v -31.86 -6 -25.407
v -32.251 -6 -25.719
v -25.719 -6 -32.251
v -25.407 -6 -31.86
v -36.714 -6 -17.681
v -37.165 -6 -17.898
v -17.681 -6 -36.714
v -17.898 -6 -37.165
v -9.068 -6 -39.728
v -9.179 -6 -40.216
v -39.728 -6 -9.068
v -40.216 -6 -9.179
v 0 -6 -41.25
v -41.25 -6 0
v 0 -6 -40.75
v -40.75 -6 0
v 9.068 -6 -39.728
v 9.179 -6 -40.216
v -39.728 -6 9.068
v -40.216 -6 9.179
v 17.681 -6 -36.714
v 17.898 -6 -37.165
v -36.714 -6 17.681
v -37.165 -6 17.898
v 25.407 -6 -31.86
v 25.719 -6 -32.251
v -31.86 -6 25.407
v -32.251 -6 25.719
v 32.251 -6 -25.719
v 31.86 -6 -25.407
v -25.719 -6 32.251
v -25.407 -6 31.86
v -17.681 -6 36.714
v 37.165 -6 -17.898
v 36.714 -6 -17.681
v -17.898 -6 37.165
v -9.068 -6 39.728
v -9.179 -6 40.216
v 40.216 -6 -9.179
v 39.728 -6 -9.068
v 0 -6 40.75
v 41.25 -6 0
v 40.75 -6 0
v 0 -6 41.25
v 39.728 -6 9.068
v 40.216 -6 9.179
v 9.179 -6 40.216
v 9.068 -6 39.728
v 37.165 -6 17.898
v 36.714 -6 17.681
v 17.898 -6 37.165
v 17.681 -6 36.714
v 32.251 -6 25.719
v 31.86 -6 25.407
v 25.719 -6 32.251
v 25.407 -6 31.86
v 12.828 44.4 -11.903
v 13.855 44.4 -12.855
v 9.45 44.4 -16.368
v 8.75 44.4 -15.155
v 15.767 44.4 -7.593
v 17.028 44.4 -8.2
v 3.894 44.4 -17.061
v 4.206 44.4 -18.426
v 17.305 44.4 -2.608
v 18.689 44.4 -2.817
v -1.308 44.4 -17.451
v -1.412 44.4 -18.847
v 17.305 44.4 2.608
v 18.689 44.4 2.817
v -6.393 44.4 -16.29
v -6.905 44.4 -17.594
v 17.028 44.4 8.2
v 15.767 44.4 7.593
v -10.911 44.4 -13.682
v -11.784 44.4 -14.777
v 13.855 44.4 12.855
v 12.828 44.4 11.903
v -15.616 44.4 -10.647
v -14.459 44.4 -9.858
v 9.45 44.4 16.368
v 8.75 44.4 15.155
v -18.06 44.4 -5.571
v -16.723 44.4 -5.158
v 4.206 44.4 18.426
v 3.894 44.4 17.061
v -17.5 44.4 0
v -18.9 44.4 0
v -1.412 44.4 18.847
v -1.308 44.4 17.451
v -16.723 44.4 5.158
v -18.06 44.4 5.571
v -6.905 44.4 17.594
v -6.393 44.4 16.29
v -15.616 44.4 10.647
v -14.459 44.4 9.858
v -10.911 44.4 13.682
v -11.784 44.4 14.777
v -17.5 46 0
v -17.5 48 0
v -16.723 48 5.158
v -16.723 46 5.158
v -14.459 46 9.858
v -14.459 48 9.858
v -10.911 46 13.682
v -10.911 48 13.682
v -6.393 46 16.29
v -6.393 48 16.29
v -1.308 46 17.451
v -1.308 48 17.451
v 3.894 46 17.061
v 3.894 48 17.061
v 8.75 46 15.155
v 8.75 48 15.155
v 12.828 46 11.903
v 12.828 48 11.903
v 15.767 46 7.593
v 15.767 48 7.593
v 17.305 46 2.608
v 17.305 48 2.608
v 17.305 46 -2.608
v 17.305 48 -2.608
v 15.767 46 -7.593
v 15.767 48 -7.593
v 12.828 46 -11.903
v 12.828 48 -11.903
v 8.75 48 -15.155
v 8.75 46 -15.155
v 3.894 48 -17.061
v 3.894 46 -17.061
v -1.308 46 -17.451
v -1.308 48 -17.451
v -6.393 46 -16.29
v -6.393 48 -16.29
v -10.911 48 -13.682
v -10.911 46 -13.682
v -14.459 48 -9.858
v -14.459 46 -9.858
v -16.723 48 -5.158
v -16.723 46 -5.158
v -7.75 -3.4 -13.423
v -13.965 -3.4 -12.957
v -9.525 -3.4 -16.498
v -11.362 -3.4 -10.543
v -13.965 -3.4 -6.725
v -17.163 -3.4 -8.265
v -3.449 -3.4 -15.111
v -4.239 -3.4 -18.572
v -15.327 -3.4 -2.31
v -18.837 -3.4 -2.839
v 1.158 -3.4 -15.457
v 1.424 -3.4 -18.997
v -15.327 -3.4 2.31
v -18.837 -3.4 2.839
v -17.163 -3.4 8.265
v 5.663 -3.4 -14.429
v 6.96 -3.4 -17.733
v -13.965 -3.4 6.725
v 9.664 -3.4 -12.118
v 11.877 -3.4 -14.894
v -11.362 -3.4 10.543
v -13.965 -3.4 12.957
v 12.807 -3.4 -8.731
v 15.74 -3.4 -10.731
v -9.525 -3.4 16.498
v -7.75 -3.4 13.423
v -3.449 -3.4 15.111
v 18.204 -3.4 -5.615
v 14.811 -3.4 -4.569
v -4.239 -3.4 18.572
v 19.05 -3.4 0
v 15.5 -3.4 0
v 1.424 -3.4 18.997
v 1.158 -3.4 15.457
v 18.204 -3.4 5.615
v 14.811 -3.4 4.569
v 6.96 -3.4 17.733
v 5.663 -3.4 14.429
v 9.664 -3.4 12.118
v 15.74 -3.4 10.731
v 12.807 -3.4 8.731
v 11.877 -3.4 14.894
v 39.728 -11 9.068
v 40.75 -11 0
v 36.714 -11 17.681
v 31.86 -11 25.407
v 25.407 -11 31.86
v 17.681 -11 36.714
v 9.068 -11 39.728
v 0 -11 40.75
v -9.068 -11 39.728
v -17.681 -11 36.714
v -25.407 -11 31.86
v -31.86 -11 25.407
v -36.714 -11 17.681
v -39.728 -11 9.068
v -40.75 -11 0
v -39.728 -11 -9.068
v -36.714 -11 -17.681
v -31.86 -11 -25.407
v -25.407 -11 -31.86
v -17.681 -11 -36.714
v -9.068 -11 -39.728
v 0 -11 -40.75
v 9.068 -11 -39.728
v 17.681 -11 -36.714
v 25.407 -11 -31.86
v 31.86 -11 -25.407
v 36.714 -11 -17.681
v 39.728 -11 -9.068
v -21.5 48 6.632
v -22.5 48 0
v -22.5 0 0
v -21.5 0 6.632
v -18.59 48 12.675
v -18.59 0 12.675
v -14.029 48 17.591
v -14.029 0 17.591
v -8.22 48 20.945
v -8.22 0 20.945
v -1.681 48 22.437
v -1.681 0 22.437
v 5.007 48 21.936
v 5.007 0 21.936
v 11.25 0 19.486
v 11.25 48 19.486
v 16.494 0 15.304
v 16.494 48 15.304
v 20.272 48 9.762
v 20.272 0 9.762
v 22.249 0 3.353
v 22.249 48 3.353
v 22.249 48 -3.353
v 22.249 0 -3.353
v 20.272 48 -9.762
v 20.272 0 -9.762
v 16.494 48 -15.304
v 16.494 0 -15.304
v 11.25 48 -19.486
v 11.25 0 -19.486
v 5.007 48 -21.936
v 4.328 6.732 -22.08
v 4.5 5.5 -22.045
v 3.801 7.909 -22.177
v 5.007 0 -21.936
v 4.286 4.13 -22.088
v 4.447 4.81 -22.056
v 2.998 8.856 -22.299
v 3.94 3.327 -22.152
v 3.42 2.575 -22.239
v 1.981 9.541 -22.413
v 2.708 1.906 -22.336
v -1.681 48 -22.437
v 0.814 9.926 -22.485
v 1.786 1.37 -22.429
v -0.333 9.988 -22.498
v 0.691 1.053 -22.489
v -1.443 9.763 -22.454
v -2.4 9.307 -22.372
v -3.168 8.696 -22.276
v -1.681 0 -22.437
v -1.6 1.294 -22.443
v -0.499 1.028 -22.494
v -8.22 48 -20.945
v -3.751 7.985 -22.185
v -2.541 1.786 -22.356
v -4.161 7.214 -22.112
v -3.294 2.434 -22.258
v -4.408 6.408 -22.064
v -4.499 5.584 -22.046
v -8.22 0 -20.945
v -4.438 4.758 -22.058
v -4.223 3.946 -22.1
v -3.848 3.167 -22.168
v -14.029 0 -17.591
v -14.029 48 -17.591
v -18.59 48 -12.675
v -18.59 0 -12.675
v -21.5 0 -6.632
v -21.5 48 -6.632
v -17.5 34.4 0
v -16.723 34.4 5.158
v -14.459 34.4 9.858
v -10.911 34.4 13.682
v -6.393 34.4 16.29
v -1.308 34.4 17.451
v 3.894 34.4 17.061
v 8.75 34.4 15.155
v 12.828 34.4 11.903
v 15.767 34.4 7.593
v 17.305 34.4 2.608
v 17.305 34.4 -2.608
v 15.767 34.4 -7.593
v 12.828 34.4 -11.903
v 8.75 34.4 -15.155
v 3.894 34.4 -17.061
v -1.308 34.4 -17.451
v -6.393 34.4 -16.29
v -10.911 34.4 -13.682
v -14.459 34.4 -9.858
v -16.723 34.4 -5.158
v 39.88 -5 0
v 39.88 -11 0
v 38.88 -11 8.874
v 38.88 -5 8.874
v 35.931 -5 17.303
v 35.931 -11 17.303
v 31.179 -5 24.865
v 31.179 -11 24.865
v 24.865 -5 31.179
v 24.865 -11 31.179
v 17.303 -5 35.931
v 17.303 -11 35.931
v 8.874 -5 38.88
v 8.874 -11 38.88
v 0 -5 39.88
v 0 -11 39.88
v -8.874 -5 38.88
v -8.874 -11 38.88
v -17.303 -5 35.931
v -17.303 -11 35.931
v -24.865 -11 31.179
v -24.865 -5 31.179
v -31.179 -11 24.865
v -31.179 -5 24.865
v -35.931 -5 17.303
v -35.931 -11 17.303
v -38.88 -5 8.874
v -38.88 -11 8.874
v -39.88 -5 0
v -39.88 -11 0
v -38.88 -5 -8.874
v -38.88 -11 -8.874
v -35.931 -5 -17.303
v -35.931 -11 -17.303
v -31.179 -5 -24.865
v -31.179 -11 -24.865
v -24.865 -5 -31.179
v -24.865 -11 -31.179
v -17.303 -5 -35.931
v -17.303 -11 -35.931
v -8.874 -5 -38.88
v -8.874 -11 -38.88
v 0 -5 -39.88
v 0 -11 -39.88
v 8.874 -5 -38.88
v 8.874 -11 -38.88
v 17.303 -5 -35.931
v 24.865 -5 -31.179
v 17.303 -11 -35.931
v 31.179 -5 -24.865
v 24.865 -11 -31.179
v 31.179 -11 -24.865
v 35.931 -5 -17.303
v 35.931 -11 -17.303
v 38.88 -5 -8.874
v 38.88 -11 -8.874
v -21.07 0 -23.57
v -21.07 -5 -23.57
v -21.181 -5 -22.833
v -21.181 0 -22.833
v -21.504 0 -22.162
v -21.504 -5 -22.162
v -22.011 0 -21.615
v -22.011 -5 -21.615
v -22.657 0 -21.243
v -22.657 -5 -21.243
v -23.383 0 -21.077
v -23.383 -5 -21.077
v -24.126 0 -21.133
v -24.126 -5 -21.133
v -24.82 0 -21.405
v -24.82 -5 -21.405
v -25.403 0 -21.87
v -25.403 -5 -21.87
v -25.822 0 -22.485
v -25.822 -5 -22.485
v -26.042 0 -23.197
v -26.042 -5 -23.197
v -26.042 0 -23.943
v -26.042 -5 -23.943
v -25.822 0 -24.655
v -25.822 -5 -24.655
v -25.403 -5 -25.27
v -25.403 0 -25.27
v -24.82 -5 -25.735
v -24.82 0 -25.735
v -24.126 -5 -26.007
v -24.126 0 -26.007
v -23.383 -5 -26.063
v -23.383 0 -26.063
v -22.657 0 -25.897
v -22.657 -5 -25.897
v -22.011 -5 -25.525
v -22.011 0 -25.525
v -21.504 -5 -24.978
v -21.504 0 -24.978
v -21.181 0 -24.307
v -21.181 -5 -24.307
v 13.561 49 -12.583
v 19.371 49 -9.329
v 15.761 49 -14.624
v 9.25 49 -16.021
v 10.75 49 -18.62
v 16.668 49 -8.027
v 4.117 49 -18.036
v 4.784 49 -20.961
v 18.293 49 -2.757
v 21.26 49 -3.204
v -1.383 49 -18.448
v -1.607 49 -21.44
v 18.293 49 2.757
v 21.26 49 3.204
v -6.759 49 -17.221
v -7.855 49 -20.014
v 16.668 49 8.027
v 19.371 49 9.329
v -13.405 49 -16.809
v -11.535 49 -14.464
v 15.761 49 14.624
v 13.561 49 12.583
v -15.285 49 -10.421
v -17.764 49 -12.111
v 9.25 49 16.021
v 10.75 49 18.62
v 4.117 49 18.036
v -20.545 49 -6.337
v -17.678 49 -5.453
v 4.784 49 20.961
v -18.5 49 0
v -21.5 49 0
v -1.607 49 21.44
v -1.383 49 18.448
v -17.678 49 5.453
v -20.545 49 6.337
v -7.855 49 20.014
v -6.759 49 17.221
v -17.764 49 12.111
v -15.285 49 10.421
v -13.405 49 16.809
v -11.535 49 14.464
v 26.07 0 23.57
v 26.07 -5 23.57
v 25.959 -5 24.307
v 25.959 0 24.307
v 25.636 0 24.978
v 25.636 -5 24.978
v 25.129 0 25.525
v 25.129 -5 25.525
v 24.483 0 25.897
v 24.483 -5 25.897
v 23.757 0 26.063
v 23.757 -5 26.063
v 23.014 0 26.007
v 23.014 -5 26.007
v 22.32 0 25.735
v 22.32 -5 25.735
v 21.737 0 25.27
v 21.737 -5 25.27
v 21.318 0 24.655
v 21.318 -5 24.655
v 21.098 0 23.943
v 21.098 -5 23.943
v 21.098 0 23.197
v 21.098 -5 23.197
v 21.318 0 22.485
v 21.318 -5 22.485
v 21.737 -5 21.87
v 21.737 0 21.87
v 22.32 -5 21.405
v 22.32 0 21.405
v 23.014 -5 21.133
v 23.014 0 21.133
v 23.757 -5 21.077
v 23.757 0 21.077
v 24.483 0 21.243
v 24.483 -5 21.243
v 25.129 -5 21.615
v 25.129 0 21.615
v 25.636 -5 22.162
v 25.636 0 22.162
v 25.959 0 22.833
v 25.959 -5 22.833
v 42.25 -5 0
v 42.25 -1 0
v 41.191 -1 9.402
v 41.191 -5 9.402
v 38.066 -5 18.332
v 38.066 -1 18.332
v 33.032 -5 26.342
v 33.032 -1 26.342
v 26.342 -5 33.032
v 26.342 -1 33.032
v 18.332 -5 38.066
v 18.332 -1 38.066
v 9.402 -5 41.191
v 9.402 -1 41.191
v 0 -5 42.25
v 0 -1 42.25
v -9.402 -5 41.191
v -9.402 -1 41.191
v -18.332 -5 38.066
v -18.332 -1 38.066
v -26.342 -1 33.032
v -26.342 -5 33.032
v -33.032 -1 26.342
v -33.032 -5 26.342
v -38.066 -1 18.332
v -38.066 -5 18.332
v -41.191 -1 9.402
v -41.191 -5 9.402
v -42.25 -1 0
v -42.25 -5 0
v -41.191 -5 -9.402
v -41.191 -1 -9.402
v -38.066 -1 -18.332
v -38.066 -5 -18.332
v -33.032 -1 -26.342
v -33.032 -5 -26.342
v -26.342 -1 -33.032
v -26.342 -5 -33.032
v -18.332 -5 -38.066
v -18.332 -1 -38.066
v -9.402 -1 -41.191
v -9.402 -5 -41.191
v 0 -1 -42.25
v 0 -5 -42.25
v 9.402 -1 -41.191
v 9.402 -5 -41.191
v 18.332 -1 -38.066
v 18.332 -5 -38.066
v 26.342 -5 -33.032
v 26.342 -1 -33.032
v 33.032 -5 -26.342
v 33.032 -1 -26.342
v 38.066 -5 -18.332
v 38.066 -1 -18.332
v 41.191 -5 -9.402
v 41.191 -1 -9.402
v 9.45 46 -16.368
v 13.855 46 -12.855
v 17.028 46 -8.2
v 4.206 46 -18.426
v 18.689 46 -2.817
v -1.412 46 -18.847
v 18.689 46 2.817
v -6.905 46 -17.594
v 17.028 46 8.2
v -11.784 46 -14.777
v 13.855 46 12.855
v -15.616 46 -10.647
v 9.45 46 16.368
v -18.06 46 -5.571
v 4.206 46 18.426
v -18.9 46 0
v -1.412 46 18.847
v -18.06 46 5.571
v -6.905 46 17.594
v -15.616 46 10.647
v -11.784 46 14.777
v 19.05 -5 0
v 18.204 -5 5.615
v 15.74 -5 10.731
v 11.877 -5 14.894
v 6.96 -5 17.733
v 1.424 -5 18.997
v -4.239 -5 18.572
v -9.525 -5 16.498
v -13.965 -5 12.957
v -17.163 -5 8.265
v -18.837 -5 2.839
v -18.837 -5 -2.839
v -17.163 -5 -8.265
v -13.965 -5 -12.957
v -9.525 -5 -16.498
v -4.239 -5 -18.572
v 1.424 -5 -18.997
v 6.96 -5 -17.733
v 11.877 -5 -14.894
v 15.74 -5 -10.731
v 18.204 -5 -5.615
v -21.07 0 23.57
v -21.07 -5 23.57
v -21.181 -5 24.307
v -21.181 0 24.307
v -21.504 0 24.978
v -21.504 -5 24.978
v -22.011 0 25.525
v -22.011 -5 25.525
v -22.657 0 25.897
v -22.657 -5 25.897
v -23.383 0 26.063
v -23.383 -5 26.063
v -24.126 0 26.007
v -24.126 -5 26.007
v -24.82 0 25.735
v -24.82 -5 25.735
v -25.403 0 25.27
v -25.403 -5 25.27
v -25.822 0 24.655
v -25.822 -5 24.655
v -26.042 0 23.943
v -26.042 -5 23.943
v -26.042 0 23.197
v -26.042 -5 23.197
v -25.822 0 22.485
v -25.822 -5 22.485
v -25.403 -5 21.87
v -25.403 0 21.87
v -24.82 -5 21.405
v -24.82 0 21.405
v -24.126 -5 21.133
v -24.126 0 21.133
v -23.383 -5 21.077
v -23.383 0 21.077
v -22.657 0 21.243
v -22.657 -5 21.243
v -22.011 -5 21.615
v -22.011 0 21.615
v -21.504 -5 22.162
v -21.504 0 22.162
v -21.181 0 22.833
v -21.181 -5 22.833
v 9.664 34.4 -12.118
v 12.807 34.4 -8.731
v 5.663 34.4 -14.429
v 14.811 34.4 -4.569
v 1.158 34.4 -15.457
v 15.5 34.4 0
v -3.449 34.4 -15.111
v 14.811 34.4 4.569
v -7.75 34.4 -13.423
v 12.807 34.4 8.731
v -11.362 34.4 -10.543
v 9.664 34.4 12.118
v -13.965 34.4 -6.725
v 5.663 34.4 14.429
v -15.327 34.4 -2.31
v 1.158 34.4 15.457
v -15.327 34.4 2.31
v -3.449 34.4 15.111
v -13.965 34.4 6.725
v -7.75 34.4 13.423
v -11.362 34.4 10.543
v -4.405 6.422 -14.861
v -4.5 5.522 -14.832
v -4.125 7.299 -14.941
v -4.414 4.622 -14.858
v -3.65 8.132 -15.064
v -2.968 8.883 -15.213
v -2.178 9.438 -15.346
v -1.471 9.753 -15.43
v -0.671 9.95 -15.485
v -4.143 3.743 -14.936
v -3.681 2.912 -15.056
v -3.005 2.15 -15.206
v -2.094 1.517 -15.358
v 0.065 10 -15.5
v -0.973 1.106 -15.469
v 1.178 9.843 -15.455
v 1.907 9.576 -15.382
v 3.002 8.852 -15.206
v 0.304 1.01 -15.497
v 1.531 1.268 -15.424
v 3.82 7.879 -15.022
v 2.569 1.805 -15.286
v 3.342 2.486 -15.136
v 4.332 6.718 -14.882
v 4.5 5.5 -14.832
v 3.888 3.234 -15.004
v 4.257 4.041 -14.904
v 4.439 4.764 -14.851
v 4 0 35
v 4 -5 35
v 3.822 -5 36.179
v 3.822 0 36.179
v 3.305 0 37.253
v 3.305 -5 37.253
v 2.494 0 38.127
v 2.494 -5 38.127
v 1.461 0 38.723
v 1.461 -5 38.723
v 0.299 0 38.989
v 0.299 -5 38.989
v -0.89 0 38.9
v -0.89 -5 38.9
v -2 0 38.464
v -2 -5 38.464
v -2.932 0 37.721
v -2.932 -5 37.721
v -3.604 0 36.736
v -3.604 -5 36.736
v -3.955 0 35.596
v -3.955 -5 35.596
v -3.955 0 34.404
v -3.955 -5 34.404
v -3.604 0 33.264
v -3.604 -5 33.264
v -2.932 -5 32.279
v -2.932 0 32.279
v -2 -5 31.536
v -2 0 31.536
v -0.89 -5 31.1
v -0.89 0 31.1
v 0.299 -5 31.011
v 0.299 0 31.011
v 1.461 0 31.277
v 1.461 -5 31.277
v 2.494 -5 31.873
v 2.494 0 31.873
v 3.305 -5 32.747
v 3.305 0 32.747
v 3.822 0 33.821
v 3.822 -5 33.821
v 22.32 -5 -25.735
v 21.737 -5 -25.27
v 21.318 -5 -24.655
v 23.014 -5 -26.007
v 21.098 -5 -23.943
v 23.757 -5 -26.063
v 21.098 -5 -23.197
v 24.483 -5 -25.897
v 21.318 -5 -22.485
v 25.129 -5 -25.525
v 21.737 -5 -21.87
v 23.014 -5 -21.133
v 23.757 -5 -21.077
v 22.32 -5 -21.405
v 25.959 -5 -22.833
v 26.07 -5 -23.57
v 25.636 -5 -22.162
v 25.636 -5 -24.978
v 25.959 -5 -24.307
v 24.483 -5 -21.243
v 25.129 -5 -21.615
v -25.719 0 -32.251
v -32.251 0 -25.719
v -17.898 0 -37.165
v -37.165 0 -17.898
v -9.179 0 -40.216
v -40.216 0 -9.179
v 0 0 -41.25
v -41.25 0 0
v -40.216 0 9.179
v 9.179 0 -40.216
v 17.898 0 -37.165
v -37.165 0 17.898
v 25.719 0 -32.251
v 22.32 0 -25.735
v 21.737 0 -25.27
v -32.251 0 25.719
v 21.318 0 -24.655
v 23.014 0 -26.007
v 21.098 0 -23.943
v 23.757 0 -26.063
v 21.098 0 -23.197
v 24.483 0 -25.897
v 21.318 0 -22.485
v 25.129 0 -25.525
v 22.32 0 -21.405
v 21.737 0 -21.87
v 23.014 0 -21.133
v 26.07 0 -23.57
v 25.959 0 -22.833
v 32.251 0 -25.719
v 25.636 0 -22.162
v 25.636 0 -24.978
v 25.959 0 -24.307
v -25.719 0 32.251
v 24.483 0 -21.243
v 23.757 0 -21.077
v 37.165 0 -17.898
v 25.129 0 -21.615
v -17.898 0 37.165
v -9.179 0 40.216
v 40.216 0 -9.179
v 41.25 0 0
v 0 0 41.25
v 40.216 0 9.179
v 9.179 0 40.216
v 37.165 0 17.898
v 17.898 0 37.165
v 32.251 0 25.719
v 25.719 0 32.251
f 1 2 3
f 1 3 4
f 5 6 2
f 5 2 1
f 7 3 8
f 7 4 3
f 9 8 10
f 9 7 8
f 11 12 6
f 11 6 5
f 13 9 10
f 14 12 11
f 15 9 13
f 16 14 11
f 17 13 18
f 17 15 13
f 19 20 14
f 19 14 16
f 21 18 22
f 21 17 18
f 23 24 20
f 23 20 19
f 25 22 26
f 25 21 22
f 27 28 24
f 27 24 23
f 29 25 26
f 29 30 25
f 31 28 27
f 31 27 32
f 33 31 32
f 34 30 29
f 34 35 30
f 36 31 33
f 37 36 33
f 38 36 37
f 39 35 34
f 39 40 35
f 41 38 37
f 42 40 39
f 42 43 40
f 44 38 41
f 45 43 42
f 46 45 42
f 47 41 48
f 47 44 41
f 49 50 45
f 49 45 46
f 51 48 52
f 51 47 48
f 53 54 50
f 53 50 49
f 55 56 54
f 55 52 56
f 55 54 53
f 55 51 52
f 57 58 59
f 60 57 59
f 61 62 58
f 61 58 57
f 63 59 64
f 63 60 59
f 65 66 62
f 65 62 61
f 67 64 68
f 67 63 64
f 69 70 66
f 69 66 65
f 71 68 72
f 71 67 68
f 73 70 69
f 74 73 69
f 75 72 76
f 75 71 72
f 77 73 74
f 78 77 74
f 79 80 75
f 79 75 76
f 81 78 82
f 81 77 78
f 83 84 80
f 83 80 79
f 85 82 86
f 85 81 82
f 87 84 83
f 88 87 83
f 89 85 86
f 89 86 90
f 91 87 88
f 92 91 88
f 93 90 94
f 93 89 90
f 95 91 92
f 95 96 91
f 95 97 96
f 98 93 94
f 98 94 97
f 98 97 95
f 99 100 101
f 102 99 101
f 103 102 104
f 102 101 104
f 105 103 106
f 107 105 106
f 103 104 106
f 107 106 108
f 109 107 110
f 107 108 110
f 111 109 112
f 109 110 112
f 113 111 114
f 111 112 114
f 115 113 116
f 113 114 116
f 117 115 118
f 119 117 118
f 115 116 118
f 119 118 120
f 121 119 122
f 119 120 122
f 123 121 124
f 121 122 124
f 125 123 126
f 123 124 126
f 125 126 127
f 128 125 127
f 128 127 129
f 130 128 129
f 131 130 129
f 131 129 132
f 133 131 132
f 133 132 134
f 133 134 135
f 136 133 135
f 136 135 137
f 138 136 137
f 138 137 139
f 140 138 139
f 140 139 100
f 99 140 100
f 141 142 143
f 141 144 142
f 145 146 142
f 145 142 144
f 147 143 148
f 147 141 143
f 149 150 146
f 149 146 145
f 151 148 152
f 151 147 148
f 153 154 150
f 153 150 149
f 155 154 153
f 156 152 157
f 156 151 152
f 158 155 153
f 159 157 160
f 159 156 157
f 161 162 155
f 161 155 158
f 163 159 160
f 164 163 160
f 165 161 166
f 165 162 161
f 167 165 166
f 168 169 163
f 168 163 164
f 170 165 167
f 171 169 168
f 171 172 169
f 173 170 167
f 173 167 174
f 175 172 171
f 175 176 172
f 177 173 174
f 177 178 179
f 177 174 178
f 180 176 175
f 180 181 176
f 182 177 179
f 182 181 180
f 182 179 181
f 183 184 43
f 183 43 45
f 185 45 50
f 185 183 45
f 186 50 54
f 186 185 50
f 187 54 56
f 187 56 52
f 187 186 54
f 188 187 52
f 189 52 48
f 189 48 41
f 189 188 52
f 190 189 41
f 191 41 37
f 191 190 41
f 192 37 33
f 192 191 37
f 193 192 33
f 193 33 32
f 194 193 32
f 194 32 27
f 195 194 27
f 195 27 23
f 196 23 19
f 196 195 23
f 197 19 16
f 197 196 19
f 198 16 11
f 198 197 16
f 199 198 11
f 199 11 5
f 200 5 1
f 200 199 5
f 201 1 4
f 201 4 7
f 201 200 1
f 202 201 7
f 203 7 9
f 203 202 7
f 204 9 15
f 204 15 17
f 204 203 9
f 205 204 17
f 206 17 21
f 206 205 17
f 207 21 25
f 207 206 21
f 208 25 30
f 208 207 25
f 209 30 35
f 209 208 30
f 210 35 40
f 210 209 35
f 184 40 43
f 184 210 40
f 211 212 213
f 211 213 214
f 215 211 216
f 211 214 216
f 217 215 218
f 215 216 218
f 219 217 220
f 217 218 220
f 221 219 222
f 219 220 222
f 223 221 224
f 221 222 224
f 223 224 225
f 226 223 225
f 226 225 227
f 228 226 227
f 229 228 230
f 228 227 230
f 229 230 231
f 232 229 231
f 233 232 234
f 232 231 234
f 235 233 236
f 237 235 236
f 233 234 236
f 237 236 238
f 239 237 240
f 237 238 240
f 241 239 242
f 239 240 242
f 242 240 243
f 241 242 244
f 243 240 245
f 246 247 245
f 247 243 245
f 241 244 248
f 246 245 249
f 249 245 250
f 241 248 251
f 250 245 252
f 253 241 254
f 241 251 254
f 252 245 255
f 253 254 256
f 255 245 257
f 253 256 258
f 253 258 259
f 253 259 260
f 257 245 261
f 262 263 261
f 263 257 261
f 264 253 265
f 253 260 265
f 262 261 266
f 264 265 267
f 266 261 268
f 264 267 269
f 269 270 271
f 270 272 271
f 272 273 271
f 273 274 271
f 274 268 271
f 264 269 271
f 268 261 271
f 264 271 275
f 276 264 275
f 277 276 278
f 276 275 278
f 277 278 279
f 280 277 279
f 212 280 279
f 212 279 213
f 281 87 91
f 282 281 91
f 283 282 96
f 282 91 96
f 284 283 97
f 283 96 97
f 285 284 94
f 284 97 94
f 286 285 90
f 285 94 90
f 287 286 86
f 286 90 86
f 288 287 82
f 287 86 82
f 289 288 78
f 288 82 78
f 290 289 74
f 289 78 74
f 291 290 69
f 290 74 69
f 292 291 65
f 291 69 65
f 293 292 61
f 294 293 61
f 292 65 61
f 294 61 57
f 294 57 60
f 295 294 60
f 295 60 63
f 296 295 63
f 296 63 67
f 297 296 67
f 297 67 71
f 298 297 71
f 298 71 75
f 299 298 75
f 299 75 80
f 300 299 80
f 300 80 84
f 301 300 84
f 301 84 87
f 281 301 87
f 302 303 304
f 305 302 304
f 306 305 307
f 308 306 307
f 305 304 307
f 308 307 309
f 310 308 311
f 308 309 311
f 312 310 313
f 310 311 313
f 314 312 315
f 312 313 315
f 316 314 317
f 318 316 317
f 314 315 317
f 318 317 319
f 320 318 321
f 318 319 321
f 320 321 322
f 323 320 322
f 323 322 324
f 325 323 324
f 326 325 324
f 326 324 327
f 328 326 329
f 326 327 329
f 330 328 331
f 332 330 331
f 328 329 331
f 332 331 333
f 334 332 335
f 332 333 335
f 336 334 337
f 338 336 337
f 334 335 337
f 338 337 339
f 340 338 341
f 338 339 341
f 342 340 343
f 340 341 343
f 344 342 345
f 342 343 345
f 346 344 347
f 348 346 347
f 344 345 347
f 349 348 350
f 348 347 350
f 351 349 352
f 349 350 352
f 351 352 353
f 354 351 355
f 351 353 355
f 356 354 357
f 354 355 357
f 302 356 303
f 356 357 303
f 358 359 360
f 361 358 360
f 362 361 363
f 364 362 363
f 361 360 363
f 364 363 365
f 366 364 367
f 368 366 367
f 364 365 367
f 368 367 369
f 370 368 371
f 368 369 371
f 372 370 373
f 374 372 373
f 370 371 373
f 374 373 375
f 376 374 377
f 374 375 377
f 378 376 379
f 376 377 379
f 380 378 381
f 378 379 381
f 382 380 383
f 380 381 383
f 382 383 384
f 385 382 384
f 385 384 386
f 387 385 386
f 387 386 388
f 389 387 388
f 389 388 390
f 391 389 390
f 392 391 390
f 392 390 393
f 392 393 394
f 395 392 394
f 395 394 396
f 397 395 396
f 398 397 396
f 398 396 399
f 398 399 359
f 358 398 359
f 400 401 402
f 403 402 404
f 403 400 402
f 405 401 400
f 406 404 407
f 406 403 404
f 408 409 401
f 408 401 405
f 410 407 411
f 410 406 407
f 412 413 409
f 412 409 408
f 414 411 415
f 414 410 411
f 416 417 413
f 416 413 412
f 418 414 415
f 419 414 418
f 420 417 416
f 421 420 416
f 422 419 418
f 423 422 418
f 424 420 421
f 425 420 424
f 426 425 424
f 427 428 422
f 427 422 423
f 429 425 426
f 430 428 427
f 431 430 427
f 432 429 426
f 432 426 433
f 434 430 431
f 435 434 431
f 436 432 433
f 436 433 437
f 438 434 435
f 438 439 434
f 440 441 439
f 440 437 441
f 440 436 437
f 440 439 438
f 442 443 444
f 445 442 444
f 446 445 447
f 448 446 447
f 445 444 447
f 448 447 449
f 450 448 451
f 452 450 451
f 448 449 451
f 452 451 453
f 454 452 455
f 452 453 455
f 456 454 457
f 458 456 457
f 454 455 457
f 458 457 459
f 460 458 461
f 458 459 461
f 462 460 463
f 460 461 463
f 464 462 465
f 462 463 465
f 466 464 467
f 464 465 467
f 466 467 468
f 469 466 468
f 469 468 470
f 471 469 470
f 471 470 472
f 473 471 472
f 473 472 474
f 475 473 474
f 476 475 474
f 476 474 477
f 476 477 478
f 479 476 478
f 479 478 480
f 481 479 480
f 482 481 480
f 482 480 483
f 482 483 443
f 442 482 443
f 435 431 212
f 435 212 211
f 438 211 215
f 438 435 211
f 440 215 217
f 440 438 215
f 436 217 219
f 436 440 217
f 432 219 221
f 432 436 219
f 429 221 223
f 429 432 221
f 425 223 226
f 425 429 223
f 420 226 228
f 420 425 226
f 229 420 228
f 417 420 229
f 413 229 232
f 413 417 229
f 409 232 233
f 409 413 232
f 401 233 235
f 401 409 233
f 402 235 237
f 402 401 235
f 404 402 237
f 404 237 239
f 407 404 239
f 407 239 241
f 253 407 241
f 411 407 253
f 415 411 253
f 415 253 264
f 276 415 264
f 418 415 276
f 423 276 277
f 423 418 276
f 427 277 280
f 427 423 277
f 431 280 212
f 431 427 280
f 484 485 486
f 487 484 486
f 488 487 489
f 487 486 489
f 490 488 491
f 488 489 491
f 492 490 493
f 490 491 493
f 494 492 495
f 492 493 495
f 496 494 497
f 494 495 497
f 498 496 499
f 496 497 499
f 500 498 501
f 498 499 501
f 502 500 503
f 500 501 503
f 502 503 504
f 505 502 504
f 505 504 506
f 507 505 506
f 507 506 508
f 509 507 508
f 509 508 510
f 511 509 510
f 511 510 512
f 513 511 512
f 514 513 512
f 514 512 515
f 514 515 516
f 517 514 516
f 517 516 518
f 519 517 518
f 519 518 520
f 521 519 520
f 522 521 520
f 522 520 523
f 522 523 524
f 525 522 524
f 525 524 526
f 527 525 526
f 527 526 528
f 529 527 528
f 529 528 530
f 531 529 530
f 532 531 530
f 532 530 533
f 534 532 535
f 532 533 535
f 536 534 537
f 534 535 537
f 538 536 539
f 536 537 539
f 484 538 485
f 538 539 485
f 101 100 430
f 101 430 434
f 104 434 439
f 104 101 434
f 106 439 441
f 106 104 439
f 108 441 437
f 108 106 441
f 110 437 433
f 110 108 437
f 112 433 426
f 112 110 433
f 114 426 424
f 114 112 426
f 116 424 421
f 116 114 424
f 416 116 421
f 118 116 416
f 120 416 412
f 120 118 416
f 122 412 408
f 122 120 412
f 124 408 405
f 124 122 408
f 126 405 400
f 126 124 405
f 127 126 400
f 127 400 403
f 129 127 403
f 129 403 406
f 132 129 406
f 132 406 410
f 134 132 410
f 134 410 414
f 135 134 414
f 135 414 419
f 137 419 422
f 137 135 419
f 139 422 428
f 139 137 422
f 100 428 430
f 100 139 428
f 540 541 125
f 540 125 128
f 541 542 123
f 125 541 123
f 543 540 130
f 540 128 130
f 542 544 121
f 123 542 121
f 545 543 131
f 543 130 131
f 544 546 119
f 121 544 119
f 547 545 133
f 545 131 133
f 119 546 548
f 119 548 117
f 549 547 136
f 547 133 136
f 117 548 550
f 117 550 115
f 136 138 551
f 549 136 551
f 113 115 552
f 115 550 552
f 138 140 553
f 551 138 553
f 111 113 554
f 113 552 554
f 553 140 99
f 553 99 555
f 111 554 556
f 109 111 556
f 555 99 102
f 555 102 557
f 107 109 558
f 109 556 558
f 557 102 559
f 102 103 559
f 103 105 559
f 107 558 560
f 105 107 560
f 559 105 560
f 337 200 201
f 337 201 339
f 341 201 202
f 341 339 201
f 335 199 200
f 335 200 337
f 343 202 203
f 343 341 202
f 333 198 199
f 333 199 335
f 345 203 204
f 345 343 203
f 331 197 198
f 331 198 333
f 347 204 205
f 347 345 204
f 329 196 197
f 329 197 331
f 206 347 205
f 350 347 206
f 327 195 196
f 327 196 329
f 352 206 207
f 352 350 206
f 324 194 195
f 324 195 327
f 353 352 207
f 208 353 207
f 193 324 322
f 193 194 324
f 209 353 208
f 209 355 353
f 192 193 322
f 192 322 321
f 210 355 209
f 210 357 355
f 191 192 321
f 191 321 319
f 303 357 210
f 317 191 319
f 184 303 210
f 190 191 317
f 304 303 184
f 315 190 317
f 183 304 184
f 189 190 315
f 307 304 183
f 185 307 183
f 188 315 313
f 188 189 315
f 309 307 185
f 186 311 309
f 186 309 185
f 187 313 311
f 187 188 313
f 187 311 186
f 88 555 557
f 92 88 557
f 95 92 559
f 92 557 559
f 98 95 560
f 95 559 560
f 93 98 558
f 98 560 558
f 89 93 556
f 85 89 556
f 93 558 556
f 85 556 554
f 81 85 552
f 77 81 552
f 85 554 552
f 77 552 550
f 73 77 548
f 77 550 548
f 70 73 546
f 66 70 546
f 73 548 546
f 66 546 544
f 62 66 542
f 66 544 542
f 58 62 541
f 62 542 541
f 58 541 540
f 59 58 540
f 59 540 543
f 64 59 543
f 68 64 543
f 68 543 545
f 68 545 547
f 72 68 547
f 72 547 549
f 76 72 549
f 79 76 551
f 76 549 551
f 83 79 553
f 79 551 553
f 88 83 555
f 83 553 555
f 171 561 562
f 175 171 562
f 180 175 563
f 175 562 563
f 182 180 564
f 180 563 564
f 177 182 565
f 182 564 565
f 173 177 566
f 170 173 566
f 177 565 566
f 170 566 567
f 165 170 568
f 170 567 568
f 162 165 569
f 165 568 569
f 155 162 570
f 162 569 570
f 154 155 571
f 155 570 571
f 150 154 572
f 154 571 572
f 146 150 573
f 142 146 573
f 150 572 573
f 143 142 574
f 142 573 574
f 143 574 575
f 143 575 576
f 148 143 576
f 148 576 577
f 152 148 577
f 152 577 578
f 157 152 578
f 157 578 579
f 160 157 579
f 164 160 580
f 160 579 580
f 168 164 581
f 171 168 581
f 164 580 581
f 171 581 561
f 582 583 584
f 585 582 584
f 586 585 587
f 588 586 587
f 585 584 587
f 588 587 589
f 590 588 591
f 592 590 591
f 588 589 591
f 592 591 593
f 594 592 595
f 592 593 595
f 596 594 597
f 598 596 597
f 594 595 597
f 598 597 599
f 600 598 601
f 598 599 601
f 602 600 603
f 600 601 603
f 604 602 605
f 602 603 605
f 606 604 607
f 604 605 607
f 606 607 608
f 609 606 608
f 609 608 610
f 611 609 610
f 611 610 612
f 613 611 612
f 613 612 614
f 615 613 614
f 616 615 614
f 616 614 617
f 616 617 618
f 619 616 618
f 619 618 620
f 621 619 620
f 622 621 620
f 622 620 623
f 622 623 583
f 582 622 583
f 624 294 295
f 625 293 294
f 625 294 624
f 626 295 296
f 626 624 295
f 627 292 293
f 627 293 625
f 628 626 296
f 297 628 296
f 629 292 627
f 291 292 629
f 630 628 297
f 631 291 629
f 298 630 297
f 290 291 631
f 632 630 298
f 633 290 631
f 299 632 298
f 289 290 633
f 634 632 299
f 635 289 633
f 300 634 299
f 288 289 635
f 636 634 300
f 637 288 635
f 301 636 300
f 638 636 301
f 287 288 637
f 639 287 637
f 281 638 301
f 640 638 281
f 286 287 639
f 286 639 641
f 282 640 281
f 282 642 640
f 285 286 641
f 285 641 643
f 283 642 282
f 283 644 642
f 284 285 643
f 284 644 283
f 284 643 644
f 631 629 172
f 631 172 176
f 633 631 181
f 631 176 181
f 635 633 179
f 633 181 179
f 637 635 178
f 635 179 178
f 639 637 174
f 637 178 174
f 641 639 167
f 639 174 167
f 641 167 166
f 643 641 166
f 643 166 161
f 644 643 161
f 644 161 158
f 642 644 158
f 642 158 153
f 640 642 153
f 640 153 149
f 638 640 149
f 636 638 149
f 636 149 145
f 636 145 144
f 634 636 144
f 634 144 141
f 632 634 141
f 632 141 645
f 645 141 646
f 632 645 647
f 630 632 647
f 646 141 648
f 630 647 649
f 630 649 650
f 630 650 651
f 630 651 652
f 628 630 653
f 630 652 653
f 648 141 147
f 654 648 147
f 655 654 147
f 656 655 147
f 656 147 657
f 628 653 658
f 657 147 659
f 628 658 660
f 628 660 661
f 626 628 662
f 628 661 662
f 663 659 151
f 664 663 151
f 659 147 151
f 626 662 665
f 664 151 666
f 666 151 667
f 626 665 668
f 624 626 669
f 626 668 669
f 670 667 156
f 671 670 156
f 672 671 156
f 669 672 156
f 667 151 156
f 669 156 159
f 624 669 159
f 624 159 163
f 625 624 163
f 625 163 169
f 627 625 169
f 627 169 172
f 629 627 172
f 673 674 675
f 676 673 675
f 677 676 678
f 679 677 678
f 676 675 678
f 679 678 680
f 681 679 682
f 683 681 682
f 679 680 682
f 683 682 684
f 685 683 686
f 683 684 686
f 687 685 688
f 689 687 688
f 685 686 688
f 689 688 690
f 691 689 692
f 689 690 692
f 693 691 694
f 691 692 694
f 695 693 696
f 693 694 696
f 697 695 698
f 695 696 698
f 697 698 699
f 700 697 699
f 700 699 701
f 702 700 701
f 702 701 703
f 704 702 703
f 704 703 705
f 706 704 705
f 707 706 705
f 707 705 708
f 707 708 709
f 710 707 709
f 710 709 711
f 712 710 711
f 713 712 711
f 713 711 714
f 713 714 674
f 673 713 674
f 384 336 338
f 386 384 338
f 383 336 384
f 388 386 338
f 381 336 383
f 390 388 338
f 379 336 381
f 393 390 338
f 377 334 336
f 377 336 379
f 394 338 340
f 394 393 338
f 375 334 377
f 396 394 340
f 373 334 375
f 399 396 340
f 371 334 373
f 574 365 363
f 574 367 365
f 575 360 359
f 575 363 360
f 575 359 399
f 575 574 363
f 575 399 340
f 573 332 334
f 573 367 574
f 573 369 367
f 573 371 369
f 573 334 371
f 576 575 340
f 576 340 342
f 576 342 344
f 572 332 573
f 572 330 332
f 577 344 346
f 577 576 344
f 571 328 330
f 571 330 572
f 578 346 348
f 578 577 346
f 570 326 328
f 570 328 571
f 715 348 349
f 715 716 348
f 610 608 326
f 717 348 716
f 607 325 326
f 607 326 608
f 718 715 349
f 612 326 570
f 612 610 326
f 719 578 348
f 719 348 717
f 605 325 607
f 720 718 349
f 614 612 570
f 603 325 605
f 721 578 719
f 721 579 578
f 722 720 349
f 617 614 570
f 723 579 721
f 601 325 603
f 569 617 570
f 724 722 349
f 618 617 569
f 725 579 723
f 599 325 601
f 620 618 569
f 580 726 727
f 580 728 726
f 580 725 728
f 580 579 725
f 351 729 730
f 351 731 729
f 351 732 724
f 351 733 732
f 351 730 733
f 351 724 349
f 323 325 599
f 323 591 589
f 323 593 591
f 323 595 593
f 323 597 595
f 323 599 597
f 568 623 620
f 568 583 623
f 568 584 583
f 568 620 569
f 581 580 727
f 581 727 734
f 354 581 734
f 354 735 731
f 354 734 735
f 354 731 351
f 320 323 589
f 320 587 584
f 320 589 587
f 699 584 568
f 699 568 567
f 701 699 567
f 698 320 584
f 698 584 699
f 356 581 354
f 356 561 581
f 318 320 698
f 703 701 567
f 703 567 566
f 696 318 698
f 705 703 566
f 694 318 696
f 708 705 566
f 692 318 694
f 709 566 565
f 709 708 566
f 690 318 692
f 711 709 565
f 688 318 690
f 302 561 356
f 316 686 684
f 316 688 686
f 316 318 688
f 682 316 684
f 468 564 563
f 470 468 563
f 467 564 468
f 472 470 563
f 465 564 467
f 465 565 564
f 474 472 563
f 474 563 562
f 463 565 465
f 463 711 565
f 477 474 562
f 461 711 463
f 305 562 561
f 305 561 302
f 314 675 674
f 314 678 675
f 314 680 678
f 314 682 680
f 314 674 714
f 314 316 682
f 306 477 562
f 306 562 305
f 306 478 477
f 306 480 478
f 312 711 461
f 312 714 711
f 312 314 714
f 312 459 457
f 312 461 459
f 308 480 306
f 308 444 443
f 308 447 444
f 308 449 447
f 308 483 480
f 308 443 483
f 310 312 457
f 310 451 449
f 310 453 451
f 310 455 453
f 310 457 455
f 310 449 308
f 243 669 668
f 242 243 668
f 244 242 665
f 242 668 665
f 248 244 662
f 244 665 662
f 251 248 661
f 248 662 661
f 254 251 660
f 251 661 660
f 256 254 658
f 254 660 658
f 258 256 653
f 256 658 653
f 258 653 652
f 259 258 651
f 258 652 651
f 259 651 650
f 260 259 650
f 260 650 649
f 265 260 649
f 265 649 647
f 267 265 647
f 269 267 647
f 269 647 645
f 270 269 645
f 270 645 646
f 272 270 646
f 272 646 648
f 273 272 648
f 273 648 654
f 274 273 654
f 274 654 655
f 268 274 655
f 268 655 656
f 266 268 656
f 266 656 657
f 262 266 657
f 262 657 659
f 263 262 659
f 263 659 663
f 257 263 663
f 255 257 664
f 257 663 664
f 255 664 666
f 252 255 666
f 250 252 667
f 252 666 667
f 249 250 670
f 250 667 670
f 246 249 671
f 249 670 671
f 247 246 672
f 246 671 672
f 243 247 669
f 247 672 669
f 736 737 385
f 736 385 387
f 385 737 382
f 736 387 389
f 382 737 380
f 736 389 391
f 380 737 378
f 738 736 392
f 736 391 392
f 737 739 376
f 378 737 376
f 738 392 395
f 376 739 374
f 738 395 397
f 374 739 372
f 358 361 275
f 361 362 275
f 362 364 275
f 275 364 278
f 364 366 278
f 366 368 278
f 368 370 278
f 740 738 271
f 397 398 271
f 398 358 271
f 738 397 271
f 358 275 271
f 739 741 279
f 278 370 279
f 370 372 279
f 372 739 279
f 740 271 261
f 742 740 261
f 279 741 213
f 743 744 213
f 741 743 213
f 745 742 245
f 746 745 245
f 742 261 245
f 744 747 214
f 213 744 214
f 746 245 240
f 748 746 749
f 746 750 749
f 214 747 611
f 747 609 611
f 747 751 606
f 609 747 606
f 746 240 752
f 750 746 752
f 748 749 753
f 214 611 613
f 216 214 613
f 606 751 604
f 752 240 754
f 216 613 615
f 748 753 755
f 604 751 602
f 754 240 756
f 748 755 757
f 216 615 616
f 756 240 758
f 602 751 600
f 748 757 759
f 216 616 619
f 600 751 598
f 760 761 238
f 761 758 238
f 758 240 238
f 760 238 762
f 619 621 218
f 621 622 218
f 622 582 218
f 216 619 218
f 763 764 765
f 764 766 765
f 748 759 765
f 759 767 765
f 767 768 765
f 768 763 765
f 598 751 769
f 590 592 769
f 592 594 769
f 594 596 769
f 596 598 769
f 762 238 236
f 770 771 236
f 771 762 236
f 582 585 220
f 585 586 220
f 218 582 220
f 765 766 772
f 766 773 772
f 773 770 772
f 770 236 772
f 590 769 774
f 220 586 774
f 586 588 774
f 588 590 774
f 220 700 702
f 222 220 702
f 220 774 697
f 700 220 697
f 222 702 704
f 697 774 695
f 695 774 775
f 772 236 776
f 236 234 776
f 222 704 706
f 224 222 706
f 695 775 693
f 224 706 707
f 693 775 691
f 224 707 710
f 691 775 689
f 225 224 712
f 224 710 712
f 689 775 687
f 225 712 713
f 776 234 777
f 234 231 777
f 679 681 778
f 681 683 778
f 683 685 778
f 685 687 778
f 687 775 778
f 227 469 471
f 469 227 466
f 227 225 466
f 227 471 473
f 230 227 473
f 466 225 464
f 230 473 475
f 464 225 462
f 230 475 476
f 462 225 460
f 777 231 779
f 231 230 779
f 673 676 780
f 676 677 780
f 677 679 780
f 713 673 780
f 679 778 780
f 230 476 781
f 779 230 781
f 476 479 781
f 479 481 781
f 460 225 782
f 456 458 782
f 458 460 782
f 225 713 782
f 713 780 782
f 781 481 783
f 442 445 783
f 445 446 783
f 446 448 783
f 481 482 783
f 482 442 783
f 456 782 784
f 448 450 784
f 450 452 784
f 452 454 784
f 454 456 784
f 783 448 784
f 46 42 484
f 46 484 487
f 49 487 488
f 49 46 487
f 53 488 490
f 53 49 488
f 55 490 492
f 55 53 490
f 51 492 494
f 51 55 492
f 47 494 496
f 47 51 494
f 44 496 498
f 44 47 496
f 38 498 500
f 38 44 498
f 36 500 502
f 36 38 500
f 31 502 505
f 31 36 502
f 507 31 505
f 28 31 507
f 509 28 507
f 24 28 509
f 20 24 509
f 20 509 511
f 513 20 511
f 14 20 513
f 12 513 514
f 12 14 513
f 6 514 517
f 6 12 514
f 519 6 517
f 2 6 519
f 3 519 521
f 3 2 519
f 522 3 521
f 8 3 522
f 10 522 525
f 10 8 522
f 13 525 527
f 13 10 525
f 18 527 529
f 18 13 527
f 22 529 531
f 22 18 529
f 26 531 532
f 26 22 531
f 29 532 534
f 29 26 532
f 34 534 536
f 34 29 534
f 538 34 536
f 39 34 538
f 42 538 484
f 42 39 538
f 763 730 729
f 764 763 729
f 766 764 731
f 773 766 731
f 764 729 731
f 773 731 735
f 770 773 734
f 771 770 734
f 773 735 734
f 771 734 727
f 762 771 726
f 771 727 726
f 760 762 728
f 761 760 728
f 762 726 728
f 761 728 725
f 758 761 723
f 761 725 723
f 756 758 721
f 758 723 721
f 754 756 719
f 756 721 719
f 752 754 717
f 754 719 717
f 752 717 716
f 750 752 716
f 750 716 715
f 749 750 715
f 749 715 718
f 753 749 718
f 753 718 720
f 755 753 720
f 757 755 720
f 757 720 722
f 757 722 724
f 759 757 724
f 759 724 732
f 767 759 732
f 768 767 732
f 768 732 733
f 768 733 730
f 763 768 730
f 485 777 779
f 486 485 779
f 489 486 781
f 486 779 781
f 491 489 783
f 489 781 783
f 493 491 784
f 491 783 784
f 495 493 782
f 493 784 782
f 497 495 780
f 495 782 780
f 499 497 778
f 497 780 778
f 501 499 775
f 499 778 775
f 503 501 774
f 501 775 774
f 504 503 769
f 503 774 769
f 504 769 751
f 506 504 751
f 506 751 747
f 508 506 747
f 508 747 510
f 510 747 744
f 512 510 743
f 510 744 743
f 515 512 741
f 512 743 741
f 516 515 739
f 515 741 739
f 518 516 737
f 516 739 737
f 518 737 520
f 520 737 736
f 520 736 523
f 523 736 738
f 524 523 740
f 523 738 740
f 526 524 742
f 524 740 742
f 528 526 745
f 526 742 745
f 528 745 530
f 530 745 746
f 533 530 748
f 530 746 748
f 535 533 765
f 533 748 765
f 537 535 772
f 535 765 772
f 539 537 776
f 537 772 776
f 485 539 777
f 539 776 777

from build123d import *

# Parameters (mm, degrees)
F0_R      = 42.25
F1_DEPTH  = 11
F2_R      = 42.25
F2_R_2    = 40.75
F3_DEPTH  = 5
F4_R      = 39.88
F5_DEPTH  = 6
F6_R      = 2.5
F6_R_2    = 4
F7_DEPTH  = 5.001
F8_R      = 19.05
F9_DEPTH  = 1.6
F10_R     = 22.5
F11_DEPTH = 49
F12_R     = 15.5
F13_DEPTH = 52.401
F14_R     = 17.5
F14_R_2   = 15.5
F15_DEPTH = 14.6
F17_R     = 18.9
F18_DEPTH = 1.6
F19_SIZE  = 1
F20_R     = 4.5
F21_DEPTH = 42.251


with BuildPart() as f1:
    # F0 (on Front) → F1 (new body)
    with BuildSketch(Plane.XZ):
        Circle(F0_R)
    extrude(amount=F1_DEPTH)

    # F2 (on face) → F3 (cut)
    with BuildSketch(Plane.XZ.offset(11)):
        Circle(F2_R)
        Circle(F2_R_2, mode=Mode.SUBTRACT)
    extrude(amount=-F3_DEPTH, mode=Mode.SUBTRACT)

    # F4 (on face) → F5 (cut)
    with BuildSketch(Plane.XZ.offset(11)):
        Circle(F4_R)
    extrude(amount=-F5_DEPTH, mode=Mode.SUBTRACT)

    # F6 (on face) → F7 (cut, through all)
    with BuildSketch(Plane.XZ.offset(5)):
        with Locations((-23.57, 23.57)):
            Circle(F6_R)
        with Locations((23.57, 23.57)):
            Circle(F6_R)
        with Locations((23.57, -23.57)):
            Circle(F6_R)
        with Locations((-23.57, -23.57)):
            Circle(F6_R)
        with Locations((0, 35)):
            Circle(F6_R_2)
    extrude(amount=-F7_DEPTH, mode=Mode.SUBTRACT)

    # F8 (on face) → F9 (cut)
    with BuildSketch(Plane.XZ.offset(5)):
        Circle(F8_R)
    extrude(amount=-F9_DEPTH, mode=Mode.SUBTRACT)

    # F10 (on face) → F11 (join)
    with BuildSketch(Plane(origin=(0, 0, 0), x_dir=(-1, 0, 0), z_dir=(0, 1, 0))):
        Circle(F10_R)
    extrude(amount=F11_DEPTH)

    # F12 (on face) → F13 (cut, through all)
    with BuildSketch(Plane.XZ.offset(3.4)):
        Circle(F12_R)
    extrude(amount=-F13_DEPTH, mode=Mode.SUBTRACT)

    # F14 (on face) → F15 (cut)
    with BuildSketch(Plane(origin=(0, 49, 0), x_dir=(-1, 0, 0), z_dir=(0, 1, 0))):
        Circle(F14_R)
        Circle(F14_R_2, mode=Mode.SUBTRACT)
    extrude(amount=-F15_DEPTH, mode=Mode.SUBTRACT)

    # F17 (on offset) → F18 (cut)
    with BuildSketch(Plane(origin=(0, 46, 0), x_dir=(-1, 0, 0), z_dir=(0, 1, 0))):
        Circle(F17_R)
    extrude(amount=-F18_DEPTH, mode=Mode.SUBTRACT)

    # F19
    f19_edges = [f1.edges().sort_by_distance(p)[0] for p in [
        (22.5, 49, 0),
        (17.5, 49, 0),
        (-42.25, 0, 0),
        (-42.25, -6, 0),
    ]]
    chamfer(f19_edges, length=F19_SIZE)

    # F20 (on Top) → F21 (cut, through all)
    with BuildSketch(Plane.XY):
        with Locations((0, 5.5)):
            Circle(F20_R)
    extrude(amount=-F21_DEPTH, mode=Mode.SUBTRACT)


solid = f1.part
